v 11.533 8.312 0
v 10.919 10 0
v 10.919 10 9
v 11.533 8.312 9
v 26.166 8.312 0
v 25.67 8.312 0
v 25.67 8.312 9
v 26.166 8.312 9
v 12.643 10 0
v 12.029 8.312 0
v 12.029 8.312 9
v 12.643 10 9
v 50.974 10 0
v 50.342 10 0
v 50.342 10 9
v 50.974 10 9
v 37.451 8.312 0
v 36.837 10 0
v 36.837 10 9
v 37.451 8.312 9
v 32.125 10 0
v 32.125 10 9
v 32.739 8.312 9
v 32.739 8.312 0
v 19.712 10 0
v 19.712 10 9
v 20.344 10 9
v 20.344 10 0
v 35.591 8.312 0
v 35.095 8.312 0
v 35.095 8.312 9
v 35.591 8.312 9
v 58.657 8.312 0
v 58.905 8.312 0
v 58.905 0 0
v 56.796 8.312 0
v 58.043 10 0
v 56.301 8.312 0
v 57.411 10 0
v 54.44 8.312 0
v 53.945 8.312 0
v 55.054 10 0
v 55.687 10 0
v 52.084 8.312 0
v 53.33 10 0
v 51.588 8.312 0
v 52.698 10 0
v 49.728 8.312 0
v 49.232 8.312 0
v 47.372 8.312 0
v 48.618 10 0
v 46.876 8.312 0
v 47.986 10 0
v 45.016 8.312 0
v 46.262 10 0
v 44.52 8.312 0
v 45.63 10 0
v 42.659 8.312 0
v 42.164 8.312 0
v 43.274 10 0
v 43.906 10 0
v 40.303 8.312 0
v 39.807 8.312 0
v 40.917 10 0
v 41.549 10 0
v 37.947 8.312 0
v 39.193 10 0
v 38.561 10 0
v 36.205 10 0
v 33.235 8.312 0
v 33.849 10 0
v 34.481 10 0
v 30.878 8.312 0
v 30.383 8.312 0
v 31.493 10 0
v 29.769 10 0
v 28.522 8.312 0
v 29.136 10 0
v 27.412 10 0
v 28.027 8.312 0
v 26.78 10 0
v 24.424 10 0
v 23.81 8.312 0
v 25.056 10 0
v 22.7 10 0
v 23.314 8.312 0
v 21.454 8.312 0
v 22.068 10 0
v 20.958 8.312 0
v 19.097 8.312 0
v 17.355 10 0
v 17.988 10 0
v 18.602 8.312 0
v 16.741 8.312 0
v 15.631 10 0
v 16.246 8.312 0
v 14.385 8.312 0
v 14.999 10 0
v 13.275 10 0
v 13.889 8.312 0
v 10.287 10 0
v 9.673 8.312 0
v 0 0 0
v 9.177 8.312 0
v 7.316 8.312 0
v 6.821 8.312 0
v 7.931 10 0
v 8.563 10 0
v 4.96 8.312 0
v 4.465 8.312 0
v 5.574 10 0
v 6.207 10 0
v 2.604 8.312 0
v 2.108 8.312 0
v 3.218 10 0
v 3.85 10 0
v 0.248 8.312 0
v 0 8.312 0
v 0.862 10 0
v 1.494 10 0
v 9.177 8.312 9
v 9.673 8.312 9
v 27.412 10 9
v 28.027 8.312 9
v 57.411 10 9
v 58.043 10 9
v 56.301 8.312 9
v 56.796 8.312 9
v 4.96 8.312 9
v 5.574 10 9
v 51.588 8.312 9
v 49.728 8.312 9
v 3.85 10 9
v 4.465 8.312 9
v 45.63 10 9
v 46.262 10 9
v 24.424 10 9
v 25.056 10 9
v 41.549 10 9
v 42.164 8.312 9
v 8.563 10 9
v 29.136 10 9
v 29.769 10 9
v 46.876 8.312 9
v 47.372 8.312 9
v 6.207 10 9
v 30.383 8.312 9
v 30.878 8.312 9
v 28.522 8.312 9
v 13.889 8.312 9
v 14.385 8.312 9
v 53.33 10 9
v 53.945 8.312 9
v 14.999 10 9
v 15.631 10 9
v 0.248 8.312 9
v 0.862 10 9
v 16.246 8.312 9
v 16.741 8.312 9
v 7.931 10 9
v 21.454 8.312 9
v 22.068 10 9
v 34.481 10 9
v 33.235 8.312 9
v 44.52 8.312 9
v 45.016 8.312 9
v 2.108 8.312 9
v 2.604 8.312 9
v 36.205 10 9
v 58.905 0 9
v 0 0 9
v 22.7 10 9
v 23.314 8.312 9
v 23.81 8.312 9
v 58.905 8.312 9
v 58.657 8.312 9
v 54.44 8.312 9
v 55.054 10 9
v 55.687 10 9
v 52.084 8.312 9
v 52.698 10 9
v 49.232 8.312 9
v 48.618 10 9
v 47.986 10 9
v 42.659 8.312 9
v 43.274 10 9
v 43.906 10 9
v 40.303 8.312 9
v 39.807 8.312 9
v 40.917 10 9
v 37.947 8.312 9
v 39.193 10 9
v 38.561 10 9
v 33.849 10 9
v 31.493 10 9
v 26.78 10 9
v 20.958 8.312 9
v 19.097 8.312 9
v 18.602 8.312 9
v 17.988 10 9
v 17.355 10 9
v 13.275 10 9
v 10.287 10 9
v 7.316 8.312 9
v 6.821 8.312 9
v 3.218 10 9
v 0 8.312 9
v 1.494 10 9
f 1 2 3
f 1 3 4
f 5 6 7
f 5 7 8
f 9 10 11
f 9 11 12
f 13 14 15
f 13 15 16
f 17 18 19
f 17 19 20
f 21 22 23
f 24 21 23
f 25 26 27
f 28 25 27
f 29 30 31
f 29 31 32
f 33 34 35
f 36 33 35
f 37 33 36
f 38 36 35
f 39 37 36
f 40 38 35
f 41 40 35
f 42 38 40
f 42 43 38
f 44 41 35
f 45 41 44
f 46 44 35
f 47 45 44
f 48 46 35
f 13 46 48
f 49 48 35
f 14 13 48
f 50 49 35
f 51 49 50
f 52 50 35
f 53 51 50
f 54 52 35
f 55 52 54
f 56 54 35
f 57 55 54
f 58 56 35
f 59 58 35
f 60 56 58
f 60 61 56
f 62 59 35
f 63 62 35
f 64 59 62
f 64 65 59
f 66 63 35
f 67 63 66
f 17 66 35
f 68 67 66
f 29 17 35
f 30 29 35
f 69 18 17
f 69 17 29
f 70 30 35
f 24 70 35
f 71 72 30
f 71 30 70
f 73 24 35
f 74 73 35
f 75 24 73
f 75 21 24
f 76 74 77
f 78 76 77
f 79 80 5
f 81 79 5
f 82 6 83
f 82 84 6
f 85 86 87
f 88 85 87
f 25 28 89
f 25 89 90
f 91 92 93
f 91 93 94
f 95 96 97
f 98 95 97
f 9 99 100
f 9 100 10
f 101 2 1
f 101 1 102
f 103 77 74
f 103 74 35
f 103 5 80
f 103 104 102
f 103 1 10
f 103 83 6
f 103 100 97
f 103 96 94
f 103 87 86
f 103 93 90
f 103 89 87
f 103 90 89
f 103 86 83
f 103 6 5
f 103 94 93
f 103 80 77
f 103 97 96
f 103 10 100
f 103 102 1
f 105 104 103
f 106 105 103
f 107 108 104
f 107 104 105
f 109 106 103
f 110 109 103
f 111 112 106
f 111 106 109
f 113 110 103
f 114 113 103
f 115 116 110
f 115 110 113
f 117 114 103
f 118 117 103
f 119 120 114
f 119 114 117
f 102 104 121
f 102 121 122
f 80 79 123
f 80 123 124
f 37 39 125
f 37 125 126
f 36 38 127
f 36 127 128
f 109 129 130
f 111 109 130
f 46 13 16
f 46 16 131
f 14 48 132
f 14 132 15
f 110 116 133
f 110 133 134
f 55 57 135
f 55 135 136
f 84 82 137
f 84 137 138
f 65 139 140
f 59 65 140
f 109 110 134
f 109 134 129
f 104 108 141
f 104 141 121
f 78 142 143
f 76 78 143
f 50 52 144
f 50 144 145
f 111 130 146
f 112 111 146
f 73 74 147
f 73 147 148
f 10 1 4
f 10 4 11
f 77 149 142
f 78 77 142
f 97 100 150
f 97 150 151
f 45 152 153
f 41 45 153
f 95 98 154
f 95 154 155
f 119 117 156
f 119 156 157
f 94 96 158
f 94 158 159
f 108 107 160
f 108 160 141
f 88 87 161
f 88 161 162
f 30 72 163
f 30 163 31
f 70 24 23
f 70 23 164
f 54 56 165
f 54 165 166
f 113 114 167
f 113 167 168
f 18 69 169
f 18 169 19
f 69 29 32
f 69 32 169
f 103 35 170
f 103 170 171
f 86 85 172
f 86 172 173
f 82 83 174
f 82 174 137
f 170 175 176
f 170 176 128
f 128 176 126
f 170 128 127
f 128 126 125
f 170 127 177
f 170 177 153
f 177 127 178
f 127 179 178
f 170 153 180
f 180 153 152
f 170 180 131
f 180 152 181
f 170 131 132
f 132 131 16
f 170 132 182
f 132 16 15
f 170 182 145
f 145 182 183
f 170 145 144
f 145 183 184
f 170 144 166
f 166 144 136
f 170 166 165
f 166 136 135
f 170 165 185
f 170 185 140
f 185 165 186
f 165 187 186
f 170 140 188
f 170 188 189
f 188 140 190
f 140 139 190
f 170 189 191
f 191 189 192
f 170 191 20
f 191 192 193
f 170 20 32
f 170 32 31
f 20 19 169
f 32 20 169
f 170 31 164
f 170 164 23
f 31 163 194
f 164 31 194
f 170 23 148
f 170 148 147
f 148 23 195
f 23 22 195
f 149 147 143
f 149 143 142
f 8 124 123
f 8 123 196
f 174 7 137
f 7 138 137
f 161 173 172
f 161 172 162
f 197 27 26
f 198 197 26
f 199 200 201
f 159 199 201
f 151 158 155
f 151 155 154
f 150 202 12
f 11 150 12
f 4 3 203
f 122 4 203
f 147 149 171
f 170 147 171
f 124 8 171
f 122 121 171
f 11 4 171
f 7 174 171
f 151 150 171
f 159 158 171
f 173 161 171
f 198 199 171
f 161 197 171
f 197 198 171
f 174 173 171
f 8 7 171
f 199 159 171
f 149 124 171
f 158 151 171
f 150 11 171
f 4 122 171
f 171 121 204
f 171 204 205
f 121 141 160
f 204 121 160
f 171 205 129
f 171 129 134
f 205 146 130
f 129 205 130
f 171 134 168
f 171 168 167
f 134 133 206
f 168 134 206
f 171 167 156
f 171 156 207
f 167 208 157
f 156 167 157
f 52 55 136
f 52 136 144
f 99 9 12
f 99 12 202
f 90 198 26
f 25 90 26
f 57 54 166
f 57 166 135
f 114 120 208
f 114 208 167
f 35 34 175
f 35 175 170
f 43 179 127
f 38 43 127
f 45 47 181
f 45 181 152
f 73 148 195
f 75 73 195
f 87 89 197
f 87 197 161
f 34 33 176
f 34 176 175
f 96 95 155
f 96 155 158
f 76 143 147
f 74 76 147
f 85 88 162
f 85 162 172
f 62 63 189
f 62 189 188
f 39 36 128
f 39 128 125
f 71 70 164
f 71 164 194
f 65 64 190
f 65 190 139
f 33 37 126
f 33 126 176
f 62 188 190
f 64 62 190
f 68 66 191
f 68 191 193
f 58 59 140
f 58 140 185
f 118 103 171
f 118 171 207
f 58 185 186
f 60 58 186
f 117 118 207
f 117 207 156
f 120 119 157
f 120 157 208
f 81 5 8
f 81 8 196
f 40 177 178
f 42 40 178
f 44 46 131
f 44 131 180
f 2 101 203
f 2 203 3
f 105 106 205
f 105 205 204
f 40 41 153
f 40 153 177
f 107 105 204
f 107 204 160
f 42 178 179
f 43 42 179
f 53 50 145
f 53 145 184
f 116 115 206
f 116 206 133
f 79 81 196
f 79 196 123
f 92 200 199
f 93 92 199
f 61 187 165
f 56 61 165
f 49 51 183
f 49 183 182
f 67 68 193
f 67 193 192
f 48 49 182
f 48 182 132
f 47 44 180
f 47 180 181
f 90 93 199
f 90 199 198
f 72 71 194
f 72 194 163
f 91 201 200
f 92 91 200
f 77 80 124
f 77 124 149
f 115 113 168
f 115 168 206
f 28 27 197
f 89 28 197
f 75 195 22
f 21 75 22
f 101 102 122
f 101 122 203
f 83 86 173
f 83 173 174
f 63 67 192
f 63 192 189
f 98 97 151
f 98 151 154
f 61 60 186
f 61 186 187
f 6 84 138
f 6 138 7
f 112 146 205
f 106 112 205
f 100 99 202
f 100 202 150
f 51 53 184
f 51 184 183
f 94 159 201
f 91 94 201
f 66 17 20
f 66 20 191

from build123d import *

# Parameters (mm, degrees)
BOSS_EXTRU_1_DEPTH = 9


with BuildPart() as part:
    # Esquisse1 → Boss.-Extru.1 (new body)
    with BuildSketch(Plane(origin=(0, 0, 0), x_dir=(-1, 0, 0), z_dir=(0, 0, -1))):
        Polygon((-58.904862255, 8.3125), (-58.904862255, 0), (0, 0), (0, 8.3125), (-0.247826528, 8.3125), (-0.862026298, 10), (-1.494168192, 10), (-2.108367962, 8.3125), (-2.604021018, 8.3125), (-3.218220788, 10), (-3.850362682, 10), (-4.464562452, 8.3125), (-4.960215508, 8.3125), (-5.574415279, 10), (-6.206557172, 10), (-6.820756943, 8.3125), (-7.316409999, 8.3125), (-7.930609769, 10), (-8.562751663, 10), (-9.176951433, 8.3125), (-9.672604489, 8.3125), (-10.286804259, 10), (-10.918946153, 10), (-11.533145923, 8.3125), (-12.028798979, 8.3125), (-12.642998749, 10), (-13.275140643, 10), (-13.889340413, 8.3125), (-14.384993469, 8.3125), (-14.999193239, 10), (-15.631335133, 10), (-16.245534903, 8.3125), (-16.741187959, 8.3125), (-17.35538773, 10), (-17.987529623, 10), (-18.601729394, 8.3125), (-19.097382449, 8.3125), (-19.71158222, 10), (-20.343724113, 10), (-20.957923884, 8.3125), (-21.45357694, 8.3125), (-22.06777671, 10), (-22.699918604, 10), (-23.314118374, 8.3125), (-23.80977143, 8.3125), (-24.4239712, 10), (-25.056113094, 10), (-25.670312864, 8.3125), (-26.16596592, 8.3125), (-26.78016569, 10), (-27.412307584, 10), (-28.026507354, 8.3125), (-28.52216041, 8.3125), (-29.136360181, 10), (-29.768502074, 10), (-30.382701845, 8.3125), (-30.8783549, 8.3125), (-31.492554671, 10), (-32.124696564, 10), (-32.738896335, 8.3125), (-33.234549391, 8.3125), (-33.848749161, 10), (-34.480891055, 10), (-35.095090825, 8.3125), (-35.590743881, 8.3125), (-36.204943651, 10), (-36.837085545, 10), (-37.451285315, 8.3125), (-37.946938371, 8.3125), (-38.561138141, 10), (-39.193280035, 10), (-39.807479805, 8.3125), (-40.303132861, 8.3125), (-40.917332632, 10), (-41.549474525, 10), (-42.163674296, 8.3125), (-42.659327351, 8.3125), (-43.273527122, 10), (-43.905669015, 10), (-44.519868786, 8.3125), (-45.015521842, 8.3125), (-45.629721612, 10), (-46.261863506, 10), (-46.876063276, 8.3125), (-47.371716332, 8.3125), (-47.985916102, 10), (-48.618057996, 10), (-49.232257766, 8.3125), (-49.727910822, 8.3125), (-50.342110592, 10), (-50.974252486, 10), (-51.588452256, 8.3125), (-52.084105312, 8.3125), (-52.698305082, 10), (-53.330446976, 10), (-53.944646747, 8.3125), (-54.440299802, 8.3125), (-55.054499573, 10), (-55.686641466, 10), (-56.300841237, 8.3125), (-56.796494293, 8.3125), (-57.410694063, 10), (-58.042835957, 10), (-58.657035727, 8.3125), align=None)
    extrude(amount=-BOSS_EXTRU_1_DEPTH)


solid = part.part
